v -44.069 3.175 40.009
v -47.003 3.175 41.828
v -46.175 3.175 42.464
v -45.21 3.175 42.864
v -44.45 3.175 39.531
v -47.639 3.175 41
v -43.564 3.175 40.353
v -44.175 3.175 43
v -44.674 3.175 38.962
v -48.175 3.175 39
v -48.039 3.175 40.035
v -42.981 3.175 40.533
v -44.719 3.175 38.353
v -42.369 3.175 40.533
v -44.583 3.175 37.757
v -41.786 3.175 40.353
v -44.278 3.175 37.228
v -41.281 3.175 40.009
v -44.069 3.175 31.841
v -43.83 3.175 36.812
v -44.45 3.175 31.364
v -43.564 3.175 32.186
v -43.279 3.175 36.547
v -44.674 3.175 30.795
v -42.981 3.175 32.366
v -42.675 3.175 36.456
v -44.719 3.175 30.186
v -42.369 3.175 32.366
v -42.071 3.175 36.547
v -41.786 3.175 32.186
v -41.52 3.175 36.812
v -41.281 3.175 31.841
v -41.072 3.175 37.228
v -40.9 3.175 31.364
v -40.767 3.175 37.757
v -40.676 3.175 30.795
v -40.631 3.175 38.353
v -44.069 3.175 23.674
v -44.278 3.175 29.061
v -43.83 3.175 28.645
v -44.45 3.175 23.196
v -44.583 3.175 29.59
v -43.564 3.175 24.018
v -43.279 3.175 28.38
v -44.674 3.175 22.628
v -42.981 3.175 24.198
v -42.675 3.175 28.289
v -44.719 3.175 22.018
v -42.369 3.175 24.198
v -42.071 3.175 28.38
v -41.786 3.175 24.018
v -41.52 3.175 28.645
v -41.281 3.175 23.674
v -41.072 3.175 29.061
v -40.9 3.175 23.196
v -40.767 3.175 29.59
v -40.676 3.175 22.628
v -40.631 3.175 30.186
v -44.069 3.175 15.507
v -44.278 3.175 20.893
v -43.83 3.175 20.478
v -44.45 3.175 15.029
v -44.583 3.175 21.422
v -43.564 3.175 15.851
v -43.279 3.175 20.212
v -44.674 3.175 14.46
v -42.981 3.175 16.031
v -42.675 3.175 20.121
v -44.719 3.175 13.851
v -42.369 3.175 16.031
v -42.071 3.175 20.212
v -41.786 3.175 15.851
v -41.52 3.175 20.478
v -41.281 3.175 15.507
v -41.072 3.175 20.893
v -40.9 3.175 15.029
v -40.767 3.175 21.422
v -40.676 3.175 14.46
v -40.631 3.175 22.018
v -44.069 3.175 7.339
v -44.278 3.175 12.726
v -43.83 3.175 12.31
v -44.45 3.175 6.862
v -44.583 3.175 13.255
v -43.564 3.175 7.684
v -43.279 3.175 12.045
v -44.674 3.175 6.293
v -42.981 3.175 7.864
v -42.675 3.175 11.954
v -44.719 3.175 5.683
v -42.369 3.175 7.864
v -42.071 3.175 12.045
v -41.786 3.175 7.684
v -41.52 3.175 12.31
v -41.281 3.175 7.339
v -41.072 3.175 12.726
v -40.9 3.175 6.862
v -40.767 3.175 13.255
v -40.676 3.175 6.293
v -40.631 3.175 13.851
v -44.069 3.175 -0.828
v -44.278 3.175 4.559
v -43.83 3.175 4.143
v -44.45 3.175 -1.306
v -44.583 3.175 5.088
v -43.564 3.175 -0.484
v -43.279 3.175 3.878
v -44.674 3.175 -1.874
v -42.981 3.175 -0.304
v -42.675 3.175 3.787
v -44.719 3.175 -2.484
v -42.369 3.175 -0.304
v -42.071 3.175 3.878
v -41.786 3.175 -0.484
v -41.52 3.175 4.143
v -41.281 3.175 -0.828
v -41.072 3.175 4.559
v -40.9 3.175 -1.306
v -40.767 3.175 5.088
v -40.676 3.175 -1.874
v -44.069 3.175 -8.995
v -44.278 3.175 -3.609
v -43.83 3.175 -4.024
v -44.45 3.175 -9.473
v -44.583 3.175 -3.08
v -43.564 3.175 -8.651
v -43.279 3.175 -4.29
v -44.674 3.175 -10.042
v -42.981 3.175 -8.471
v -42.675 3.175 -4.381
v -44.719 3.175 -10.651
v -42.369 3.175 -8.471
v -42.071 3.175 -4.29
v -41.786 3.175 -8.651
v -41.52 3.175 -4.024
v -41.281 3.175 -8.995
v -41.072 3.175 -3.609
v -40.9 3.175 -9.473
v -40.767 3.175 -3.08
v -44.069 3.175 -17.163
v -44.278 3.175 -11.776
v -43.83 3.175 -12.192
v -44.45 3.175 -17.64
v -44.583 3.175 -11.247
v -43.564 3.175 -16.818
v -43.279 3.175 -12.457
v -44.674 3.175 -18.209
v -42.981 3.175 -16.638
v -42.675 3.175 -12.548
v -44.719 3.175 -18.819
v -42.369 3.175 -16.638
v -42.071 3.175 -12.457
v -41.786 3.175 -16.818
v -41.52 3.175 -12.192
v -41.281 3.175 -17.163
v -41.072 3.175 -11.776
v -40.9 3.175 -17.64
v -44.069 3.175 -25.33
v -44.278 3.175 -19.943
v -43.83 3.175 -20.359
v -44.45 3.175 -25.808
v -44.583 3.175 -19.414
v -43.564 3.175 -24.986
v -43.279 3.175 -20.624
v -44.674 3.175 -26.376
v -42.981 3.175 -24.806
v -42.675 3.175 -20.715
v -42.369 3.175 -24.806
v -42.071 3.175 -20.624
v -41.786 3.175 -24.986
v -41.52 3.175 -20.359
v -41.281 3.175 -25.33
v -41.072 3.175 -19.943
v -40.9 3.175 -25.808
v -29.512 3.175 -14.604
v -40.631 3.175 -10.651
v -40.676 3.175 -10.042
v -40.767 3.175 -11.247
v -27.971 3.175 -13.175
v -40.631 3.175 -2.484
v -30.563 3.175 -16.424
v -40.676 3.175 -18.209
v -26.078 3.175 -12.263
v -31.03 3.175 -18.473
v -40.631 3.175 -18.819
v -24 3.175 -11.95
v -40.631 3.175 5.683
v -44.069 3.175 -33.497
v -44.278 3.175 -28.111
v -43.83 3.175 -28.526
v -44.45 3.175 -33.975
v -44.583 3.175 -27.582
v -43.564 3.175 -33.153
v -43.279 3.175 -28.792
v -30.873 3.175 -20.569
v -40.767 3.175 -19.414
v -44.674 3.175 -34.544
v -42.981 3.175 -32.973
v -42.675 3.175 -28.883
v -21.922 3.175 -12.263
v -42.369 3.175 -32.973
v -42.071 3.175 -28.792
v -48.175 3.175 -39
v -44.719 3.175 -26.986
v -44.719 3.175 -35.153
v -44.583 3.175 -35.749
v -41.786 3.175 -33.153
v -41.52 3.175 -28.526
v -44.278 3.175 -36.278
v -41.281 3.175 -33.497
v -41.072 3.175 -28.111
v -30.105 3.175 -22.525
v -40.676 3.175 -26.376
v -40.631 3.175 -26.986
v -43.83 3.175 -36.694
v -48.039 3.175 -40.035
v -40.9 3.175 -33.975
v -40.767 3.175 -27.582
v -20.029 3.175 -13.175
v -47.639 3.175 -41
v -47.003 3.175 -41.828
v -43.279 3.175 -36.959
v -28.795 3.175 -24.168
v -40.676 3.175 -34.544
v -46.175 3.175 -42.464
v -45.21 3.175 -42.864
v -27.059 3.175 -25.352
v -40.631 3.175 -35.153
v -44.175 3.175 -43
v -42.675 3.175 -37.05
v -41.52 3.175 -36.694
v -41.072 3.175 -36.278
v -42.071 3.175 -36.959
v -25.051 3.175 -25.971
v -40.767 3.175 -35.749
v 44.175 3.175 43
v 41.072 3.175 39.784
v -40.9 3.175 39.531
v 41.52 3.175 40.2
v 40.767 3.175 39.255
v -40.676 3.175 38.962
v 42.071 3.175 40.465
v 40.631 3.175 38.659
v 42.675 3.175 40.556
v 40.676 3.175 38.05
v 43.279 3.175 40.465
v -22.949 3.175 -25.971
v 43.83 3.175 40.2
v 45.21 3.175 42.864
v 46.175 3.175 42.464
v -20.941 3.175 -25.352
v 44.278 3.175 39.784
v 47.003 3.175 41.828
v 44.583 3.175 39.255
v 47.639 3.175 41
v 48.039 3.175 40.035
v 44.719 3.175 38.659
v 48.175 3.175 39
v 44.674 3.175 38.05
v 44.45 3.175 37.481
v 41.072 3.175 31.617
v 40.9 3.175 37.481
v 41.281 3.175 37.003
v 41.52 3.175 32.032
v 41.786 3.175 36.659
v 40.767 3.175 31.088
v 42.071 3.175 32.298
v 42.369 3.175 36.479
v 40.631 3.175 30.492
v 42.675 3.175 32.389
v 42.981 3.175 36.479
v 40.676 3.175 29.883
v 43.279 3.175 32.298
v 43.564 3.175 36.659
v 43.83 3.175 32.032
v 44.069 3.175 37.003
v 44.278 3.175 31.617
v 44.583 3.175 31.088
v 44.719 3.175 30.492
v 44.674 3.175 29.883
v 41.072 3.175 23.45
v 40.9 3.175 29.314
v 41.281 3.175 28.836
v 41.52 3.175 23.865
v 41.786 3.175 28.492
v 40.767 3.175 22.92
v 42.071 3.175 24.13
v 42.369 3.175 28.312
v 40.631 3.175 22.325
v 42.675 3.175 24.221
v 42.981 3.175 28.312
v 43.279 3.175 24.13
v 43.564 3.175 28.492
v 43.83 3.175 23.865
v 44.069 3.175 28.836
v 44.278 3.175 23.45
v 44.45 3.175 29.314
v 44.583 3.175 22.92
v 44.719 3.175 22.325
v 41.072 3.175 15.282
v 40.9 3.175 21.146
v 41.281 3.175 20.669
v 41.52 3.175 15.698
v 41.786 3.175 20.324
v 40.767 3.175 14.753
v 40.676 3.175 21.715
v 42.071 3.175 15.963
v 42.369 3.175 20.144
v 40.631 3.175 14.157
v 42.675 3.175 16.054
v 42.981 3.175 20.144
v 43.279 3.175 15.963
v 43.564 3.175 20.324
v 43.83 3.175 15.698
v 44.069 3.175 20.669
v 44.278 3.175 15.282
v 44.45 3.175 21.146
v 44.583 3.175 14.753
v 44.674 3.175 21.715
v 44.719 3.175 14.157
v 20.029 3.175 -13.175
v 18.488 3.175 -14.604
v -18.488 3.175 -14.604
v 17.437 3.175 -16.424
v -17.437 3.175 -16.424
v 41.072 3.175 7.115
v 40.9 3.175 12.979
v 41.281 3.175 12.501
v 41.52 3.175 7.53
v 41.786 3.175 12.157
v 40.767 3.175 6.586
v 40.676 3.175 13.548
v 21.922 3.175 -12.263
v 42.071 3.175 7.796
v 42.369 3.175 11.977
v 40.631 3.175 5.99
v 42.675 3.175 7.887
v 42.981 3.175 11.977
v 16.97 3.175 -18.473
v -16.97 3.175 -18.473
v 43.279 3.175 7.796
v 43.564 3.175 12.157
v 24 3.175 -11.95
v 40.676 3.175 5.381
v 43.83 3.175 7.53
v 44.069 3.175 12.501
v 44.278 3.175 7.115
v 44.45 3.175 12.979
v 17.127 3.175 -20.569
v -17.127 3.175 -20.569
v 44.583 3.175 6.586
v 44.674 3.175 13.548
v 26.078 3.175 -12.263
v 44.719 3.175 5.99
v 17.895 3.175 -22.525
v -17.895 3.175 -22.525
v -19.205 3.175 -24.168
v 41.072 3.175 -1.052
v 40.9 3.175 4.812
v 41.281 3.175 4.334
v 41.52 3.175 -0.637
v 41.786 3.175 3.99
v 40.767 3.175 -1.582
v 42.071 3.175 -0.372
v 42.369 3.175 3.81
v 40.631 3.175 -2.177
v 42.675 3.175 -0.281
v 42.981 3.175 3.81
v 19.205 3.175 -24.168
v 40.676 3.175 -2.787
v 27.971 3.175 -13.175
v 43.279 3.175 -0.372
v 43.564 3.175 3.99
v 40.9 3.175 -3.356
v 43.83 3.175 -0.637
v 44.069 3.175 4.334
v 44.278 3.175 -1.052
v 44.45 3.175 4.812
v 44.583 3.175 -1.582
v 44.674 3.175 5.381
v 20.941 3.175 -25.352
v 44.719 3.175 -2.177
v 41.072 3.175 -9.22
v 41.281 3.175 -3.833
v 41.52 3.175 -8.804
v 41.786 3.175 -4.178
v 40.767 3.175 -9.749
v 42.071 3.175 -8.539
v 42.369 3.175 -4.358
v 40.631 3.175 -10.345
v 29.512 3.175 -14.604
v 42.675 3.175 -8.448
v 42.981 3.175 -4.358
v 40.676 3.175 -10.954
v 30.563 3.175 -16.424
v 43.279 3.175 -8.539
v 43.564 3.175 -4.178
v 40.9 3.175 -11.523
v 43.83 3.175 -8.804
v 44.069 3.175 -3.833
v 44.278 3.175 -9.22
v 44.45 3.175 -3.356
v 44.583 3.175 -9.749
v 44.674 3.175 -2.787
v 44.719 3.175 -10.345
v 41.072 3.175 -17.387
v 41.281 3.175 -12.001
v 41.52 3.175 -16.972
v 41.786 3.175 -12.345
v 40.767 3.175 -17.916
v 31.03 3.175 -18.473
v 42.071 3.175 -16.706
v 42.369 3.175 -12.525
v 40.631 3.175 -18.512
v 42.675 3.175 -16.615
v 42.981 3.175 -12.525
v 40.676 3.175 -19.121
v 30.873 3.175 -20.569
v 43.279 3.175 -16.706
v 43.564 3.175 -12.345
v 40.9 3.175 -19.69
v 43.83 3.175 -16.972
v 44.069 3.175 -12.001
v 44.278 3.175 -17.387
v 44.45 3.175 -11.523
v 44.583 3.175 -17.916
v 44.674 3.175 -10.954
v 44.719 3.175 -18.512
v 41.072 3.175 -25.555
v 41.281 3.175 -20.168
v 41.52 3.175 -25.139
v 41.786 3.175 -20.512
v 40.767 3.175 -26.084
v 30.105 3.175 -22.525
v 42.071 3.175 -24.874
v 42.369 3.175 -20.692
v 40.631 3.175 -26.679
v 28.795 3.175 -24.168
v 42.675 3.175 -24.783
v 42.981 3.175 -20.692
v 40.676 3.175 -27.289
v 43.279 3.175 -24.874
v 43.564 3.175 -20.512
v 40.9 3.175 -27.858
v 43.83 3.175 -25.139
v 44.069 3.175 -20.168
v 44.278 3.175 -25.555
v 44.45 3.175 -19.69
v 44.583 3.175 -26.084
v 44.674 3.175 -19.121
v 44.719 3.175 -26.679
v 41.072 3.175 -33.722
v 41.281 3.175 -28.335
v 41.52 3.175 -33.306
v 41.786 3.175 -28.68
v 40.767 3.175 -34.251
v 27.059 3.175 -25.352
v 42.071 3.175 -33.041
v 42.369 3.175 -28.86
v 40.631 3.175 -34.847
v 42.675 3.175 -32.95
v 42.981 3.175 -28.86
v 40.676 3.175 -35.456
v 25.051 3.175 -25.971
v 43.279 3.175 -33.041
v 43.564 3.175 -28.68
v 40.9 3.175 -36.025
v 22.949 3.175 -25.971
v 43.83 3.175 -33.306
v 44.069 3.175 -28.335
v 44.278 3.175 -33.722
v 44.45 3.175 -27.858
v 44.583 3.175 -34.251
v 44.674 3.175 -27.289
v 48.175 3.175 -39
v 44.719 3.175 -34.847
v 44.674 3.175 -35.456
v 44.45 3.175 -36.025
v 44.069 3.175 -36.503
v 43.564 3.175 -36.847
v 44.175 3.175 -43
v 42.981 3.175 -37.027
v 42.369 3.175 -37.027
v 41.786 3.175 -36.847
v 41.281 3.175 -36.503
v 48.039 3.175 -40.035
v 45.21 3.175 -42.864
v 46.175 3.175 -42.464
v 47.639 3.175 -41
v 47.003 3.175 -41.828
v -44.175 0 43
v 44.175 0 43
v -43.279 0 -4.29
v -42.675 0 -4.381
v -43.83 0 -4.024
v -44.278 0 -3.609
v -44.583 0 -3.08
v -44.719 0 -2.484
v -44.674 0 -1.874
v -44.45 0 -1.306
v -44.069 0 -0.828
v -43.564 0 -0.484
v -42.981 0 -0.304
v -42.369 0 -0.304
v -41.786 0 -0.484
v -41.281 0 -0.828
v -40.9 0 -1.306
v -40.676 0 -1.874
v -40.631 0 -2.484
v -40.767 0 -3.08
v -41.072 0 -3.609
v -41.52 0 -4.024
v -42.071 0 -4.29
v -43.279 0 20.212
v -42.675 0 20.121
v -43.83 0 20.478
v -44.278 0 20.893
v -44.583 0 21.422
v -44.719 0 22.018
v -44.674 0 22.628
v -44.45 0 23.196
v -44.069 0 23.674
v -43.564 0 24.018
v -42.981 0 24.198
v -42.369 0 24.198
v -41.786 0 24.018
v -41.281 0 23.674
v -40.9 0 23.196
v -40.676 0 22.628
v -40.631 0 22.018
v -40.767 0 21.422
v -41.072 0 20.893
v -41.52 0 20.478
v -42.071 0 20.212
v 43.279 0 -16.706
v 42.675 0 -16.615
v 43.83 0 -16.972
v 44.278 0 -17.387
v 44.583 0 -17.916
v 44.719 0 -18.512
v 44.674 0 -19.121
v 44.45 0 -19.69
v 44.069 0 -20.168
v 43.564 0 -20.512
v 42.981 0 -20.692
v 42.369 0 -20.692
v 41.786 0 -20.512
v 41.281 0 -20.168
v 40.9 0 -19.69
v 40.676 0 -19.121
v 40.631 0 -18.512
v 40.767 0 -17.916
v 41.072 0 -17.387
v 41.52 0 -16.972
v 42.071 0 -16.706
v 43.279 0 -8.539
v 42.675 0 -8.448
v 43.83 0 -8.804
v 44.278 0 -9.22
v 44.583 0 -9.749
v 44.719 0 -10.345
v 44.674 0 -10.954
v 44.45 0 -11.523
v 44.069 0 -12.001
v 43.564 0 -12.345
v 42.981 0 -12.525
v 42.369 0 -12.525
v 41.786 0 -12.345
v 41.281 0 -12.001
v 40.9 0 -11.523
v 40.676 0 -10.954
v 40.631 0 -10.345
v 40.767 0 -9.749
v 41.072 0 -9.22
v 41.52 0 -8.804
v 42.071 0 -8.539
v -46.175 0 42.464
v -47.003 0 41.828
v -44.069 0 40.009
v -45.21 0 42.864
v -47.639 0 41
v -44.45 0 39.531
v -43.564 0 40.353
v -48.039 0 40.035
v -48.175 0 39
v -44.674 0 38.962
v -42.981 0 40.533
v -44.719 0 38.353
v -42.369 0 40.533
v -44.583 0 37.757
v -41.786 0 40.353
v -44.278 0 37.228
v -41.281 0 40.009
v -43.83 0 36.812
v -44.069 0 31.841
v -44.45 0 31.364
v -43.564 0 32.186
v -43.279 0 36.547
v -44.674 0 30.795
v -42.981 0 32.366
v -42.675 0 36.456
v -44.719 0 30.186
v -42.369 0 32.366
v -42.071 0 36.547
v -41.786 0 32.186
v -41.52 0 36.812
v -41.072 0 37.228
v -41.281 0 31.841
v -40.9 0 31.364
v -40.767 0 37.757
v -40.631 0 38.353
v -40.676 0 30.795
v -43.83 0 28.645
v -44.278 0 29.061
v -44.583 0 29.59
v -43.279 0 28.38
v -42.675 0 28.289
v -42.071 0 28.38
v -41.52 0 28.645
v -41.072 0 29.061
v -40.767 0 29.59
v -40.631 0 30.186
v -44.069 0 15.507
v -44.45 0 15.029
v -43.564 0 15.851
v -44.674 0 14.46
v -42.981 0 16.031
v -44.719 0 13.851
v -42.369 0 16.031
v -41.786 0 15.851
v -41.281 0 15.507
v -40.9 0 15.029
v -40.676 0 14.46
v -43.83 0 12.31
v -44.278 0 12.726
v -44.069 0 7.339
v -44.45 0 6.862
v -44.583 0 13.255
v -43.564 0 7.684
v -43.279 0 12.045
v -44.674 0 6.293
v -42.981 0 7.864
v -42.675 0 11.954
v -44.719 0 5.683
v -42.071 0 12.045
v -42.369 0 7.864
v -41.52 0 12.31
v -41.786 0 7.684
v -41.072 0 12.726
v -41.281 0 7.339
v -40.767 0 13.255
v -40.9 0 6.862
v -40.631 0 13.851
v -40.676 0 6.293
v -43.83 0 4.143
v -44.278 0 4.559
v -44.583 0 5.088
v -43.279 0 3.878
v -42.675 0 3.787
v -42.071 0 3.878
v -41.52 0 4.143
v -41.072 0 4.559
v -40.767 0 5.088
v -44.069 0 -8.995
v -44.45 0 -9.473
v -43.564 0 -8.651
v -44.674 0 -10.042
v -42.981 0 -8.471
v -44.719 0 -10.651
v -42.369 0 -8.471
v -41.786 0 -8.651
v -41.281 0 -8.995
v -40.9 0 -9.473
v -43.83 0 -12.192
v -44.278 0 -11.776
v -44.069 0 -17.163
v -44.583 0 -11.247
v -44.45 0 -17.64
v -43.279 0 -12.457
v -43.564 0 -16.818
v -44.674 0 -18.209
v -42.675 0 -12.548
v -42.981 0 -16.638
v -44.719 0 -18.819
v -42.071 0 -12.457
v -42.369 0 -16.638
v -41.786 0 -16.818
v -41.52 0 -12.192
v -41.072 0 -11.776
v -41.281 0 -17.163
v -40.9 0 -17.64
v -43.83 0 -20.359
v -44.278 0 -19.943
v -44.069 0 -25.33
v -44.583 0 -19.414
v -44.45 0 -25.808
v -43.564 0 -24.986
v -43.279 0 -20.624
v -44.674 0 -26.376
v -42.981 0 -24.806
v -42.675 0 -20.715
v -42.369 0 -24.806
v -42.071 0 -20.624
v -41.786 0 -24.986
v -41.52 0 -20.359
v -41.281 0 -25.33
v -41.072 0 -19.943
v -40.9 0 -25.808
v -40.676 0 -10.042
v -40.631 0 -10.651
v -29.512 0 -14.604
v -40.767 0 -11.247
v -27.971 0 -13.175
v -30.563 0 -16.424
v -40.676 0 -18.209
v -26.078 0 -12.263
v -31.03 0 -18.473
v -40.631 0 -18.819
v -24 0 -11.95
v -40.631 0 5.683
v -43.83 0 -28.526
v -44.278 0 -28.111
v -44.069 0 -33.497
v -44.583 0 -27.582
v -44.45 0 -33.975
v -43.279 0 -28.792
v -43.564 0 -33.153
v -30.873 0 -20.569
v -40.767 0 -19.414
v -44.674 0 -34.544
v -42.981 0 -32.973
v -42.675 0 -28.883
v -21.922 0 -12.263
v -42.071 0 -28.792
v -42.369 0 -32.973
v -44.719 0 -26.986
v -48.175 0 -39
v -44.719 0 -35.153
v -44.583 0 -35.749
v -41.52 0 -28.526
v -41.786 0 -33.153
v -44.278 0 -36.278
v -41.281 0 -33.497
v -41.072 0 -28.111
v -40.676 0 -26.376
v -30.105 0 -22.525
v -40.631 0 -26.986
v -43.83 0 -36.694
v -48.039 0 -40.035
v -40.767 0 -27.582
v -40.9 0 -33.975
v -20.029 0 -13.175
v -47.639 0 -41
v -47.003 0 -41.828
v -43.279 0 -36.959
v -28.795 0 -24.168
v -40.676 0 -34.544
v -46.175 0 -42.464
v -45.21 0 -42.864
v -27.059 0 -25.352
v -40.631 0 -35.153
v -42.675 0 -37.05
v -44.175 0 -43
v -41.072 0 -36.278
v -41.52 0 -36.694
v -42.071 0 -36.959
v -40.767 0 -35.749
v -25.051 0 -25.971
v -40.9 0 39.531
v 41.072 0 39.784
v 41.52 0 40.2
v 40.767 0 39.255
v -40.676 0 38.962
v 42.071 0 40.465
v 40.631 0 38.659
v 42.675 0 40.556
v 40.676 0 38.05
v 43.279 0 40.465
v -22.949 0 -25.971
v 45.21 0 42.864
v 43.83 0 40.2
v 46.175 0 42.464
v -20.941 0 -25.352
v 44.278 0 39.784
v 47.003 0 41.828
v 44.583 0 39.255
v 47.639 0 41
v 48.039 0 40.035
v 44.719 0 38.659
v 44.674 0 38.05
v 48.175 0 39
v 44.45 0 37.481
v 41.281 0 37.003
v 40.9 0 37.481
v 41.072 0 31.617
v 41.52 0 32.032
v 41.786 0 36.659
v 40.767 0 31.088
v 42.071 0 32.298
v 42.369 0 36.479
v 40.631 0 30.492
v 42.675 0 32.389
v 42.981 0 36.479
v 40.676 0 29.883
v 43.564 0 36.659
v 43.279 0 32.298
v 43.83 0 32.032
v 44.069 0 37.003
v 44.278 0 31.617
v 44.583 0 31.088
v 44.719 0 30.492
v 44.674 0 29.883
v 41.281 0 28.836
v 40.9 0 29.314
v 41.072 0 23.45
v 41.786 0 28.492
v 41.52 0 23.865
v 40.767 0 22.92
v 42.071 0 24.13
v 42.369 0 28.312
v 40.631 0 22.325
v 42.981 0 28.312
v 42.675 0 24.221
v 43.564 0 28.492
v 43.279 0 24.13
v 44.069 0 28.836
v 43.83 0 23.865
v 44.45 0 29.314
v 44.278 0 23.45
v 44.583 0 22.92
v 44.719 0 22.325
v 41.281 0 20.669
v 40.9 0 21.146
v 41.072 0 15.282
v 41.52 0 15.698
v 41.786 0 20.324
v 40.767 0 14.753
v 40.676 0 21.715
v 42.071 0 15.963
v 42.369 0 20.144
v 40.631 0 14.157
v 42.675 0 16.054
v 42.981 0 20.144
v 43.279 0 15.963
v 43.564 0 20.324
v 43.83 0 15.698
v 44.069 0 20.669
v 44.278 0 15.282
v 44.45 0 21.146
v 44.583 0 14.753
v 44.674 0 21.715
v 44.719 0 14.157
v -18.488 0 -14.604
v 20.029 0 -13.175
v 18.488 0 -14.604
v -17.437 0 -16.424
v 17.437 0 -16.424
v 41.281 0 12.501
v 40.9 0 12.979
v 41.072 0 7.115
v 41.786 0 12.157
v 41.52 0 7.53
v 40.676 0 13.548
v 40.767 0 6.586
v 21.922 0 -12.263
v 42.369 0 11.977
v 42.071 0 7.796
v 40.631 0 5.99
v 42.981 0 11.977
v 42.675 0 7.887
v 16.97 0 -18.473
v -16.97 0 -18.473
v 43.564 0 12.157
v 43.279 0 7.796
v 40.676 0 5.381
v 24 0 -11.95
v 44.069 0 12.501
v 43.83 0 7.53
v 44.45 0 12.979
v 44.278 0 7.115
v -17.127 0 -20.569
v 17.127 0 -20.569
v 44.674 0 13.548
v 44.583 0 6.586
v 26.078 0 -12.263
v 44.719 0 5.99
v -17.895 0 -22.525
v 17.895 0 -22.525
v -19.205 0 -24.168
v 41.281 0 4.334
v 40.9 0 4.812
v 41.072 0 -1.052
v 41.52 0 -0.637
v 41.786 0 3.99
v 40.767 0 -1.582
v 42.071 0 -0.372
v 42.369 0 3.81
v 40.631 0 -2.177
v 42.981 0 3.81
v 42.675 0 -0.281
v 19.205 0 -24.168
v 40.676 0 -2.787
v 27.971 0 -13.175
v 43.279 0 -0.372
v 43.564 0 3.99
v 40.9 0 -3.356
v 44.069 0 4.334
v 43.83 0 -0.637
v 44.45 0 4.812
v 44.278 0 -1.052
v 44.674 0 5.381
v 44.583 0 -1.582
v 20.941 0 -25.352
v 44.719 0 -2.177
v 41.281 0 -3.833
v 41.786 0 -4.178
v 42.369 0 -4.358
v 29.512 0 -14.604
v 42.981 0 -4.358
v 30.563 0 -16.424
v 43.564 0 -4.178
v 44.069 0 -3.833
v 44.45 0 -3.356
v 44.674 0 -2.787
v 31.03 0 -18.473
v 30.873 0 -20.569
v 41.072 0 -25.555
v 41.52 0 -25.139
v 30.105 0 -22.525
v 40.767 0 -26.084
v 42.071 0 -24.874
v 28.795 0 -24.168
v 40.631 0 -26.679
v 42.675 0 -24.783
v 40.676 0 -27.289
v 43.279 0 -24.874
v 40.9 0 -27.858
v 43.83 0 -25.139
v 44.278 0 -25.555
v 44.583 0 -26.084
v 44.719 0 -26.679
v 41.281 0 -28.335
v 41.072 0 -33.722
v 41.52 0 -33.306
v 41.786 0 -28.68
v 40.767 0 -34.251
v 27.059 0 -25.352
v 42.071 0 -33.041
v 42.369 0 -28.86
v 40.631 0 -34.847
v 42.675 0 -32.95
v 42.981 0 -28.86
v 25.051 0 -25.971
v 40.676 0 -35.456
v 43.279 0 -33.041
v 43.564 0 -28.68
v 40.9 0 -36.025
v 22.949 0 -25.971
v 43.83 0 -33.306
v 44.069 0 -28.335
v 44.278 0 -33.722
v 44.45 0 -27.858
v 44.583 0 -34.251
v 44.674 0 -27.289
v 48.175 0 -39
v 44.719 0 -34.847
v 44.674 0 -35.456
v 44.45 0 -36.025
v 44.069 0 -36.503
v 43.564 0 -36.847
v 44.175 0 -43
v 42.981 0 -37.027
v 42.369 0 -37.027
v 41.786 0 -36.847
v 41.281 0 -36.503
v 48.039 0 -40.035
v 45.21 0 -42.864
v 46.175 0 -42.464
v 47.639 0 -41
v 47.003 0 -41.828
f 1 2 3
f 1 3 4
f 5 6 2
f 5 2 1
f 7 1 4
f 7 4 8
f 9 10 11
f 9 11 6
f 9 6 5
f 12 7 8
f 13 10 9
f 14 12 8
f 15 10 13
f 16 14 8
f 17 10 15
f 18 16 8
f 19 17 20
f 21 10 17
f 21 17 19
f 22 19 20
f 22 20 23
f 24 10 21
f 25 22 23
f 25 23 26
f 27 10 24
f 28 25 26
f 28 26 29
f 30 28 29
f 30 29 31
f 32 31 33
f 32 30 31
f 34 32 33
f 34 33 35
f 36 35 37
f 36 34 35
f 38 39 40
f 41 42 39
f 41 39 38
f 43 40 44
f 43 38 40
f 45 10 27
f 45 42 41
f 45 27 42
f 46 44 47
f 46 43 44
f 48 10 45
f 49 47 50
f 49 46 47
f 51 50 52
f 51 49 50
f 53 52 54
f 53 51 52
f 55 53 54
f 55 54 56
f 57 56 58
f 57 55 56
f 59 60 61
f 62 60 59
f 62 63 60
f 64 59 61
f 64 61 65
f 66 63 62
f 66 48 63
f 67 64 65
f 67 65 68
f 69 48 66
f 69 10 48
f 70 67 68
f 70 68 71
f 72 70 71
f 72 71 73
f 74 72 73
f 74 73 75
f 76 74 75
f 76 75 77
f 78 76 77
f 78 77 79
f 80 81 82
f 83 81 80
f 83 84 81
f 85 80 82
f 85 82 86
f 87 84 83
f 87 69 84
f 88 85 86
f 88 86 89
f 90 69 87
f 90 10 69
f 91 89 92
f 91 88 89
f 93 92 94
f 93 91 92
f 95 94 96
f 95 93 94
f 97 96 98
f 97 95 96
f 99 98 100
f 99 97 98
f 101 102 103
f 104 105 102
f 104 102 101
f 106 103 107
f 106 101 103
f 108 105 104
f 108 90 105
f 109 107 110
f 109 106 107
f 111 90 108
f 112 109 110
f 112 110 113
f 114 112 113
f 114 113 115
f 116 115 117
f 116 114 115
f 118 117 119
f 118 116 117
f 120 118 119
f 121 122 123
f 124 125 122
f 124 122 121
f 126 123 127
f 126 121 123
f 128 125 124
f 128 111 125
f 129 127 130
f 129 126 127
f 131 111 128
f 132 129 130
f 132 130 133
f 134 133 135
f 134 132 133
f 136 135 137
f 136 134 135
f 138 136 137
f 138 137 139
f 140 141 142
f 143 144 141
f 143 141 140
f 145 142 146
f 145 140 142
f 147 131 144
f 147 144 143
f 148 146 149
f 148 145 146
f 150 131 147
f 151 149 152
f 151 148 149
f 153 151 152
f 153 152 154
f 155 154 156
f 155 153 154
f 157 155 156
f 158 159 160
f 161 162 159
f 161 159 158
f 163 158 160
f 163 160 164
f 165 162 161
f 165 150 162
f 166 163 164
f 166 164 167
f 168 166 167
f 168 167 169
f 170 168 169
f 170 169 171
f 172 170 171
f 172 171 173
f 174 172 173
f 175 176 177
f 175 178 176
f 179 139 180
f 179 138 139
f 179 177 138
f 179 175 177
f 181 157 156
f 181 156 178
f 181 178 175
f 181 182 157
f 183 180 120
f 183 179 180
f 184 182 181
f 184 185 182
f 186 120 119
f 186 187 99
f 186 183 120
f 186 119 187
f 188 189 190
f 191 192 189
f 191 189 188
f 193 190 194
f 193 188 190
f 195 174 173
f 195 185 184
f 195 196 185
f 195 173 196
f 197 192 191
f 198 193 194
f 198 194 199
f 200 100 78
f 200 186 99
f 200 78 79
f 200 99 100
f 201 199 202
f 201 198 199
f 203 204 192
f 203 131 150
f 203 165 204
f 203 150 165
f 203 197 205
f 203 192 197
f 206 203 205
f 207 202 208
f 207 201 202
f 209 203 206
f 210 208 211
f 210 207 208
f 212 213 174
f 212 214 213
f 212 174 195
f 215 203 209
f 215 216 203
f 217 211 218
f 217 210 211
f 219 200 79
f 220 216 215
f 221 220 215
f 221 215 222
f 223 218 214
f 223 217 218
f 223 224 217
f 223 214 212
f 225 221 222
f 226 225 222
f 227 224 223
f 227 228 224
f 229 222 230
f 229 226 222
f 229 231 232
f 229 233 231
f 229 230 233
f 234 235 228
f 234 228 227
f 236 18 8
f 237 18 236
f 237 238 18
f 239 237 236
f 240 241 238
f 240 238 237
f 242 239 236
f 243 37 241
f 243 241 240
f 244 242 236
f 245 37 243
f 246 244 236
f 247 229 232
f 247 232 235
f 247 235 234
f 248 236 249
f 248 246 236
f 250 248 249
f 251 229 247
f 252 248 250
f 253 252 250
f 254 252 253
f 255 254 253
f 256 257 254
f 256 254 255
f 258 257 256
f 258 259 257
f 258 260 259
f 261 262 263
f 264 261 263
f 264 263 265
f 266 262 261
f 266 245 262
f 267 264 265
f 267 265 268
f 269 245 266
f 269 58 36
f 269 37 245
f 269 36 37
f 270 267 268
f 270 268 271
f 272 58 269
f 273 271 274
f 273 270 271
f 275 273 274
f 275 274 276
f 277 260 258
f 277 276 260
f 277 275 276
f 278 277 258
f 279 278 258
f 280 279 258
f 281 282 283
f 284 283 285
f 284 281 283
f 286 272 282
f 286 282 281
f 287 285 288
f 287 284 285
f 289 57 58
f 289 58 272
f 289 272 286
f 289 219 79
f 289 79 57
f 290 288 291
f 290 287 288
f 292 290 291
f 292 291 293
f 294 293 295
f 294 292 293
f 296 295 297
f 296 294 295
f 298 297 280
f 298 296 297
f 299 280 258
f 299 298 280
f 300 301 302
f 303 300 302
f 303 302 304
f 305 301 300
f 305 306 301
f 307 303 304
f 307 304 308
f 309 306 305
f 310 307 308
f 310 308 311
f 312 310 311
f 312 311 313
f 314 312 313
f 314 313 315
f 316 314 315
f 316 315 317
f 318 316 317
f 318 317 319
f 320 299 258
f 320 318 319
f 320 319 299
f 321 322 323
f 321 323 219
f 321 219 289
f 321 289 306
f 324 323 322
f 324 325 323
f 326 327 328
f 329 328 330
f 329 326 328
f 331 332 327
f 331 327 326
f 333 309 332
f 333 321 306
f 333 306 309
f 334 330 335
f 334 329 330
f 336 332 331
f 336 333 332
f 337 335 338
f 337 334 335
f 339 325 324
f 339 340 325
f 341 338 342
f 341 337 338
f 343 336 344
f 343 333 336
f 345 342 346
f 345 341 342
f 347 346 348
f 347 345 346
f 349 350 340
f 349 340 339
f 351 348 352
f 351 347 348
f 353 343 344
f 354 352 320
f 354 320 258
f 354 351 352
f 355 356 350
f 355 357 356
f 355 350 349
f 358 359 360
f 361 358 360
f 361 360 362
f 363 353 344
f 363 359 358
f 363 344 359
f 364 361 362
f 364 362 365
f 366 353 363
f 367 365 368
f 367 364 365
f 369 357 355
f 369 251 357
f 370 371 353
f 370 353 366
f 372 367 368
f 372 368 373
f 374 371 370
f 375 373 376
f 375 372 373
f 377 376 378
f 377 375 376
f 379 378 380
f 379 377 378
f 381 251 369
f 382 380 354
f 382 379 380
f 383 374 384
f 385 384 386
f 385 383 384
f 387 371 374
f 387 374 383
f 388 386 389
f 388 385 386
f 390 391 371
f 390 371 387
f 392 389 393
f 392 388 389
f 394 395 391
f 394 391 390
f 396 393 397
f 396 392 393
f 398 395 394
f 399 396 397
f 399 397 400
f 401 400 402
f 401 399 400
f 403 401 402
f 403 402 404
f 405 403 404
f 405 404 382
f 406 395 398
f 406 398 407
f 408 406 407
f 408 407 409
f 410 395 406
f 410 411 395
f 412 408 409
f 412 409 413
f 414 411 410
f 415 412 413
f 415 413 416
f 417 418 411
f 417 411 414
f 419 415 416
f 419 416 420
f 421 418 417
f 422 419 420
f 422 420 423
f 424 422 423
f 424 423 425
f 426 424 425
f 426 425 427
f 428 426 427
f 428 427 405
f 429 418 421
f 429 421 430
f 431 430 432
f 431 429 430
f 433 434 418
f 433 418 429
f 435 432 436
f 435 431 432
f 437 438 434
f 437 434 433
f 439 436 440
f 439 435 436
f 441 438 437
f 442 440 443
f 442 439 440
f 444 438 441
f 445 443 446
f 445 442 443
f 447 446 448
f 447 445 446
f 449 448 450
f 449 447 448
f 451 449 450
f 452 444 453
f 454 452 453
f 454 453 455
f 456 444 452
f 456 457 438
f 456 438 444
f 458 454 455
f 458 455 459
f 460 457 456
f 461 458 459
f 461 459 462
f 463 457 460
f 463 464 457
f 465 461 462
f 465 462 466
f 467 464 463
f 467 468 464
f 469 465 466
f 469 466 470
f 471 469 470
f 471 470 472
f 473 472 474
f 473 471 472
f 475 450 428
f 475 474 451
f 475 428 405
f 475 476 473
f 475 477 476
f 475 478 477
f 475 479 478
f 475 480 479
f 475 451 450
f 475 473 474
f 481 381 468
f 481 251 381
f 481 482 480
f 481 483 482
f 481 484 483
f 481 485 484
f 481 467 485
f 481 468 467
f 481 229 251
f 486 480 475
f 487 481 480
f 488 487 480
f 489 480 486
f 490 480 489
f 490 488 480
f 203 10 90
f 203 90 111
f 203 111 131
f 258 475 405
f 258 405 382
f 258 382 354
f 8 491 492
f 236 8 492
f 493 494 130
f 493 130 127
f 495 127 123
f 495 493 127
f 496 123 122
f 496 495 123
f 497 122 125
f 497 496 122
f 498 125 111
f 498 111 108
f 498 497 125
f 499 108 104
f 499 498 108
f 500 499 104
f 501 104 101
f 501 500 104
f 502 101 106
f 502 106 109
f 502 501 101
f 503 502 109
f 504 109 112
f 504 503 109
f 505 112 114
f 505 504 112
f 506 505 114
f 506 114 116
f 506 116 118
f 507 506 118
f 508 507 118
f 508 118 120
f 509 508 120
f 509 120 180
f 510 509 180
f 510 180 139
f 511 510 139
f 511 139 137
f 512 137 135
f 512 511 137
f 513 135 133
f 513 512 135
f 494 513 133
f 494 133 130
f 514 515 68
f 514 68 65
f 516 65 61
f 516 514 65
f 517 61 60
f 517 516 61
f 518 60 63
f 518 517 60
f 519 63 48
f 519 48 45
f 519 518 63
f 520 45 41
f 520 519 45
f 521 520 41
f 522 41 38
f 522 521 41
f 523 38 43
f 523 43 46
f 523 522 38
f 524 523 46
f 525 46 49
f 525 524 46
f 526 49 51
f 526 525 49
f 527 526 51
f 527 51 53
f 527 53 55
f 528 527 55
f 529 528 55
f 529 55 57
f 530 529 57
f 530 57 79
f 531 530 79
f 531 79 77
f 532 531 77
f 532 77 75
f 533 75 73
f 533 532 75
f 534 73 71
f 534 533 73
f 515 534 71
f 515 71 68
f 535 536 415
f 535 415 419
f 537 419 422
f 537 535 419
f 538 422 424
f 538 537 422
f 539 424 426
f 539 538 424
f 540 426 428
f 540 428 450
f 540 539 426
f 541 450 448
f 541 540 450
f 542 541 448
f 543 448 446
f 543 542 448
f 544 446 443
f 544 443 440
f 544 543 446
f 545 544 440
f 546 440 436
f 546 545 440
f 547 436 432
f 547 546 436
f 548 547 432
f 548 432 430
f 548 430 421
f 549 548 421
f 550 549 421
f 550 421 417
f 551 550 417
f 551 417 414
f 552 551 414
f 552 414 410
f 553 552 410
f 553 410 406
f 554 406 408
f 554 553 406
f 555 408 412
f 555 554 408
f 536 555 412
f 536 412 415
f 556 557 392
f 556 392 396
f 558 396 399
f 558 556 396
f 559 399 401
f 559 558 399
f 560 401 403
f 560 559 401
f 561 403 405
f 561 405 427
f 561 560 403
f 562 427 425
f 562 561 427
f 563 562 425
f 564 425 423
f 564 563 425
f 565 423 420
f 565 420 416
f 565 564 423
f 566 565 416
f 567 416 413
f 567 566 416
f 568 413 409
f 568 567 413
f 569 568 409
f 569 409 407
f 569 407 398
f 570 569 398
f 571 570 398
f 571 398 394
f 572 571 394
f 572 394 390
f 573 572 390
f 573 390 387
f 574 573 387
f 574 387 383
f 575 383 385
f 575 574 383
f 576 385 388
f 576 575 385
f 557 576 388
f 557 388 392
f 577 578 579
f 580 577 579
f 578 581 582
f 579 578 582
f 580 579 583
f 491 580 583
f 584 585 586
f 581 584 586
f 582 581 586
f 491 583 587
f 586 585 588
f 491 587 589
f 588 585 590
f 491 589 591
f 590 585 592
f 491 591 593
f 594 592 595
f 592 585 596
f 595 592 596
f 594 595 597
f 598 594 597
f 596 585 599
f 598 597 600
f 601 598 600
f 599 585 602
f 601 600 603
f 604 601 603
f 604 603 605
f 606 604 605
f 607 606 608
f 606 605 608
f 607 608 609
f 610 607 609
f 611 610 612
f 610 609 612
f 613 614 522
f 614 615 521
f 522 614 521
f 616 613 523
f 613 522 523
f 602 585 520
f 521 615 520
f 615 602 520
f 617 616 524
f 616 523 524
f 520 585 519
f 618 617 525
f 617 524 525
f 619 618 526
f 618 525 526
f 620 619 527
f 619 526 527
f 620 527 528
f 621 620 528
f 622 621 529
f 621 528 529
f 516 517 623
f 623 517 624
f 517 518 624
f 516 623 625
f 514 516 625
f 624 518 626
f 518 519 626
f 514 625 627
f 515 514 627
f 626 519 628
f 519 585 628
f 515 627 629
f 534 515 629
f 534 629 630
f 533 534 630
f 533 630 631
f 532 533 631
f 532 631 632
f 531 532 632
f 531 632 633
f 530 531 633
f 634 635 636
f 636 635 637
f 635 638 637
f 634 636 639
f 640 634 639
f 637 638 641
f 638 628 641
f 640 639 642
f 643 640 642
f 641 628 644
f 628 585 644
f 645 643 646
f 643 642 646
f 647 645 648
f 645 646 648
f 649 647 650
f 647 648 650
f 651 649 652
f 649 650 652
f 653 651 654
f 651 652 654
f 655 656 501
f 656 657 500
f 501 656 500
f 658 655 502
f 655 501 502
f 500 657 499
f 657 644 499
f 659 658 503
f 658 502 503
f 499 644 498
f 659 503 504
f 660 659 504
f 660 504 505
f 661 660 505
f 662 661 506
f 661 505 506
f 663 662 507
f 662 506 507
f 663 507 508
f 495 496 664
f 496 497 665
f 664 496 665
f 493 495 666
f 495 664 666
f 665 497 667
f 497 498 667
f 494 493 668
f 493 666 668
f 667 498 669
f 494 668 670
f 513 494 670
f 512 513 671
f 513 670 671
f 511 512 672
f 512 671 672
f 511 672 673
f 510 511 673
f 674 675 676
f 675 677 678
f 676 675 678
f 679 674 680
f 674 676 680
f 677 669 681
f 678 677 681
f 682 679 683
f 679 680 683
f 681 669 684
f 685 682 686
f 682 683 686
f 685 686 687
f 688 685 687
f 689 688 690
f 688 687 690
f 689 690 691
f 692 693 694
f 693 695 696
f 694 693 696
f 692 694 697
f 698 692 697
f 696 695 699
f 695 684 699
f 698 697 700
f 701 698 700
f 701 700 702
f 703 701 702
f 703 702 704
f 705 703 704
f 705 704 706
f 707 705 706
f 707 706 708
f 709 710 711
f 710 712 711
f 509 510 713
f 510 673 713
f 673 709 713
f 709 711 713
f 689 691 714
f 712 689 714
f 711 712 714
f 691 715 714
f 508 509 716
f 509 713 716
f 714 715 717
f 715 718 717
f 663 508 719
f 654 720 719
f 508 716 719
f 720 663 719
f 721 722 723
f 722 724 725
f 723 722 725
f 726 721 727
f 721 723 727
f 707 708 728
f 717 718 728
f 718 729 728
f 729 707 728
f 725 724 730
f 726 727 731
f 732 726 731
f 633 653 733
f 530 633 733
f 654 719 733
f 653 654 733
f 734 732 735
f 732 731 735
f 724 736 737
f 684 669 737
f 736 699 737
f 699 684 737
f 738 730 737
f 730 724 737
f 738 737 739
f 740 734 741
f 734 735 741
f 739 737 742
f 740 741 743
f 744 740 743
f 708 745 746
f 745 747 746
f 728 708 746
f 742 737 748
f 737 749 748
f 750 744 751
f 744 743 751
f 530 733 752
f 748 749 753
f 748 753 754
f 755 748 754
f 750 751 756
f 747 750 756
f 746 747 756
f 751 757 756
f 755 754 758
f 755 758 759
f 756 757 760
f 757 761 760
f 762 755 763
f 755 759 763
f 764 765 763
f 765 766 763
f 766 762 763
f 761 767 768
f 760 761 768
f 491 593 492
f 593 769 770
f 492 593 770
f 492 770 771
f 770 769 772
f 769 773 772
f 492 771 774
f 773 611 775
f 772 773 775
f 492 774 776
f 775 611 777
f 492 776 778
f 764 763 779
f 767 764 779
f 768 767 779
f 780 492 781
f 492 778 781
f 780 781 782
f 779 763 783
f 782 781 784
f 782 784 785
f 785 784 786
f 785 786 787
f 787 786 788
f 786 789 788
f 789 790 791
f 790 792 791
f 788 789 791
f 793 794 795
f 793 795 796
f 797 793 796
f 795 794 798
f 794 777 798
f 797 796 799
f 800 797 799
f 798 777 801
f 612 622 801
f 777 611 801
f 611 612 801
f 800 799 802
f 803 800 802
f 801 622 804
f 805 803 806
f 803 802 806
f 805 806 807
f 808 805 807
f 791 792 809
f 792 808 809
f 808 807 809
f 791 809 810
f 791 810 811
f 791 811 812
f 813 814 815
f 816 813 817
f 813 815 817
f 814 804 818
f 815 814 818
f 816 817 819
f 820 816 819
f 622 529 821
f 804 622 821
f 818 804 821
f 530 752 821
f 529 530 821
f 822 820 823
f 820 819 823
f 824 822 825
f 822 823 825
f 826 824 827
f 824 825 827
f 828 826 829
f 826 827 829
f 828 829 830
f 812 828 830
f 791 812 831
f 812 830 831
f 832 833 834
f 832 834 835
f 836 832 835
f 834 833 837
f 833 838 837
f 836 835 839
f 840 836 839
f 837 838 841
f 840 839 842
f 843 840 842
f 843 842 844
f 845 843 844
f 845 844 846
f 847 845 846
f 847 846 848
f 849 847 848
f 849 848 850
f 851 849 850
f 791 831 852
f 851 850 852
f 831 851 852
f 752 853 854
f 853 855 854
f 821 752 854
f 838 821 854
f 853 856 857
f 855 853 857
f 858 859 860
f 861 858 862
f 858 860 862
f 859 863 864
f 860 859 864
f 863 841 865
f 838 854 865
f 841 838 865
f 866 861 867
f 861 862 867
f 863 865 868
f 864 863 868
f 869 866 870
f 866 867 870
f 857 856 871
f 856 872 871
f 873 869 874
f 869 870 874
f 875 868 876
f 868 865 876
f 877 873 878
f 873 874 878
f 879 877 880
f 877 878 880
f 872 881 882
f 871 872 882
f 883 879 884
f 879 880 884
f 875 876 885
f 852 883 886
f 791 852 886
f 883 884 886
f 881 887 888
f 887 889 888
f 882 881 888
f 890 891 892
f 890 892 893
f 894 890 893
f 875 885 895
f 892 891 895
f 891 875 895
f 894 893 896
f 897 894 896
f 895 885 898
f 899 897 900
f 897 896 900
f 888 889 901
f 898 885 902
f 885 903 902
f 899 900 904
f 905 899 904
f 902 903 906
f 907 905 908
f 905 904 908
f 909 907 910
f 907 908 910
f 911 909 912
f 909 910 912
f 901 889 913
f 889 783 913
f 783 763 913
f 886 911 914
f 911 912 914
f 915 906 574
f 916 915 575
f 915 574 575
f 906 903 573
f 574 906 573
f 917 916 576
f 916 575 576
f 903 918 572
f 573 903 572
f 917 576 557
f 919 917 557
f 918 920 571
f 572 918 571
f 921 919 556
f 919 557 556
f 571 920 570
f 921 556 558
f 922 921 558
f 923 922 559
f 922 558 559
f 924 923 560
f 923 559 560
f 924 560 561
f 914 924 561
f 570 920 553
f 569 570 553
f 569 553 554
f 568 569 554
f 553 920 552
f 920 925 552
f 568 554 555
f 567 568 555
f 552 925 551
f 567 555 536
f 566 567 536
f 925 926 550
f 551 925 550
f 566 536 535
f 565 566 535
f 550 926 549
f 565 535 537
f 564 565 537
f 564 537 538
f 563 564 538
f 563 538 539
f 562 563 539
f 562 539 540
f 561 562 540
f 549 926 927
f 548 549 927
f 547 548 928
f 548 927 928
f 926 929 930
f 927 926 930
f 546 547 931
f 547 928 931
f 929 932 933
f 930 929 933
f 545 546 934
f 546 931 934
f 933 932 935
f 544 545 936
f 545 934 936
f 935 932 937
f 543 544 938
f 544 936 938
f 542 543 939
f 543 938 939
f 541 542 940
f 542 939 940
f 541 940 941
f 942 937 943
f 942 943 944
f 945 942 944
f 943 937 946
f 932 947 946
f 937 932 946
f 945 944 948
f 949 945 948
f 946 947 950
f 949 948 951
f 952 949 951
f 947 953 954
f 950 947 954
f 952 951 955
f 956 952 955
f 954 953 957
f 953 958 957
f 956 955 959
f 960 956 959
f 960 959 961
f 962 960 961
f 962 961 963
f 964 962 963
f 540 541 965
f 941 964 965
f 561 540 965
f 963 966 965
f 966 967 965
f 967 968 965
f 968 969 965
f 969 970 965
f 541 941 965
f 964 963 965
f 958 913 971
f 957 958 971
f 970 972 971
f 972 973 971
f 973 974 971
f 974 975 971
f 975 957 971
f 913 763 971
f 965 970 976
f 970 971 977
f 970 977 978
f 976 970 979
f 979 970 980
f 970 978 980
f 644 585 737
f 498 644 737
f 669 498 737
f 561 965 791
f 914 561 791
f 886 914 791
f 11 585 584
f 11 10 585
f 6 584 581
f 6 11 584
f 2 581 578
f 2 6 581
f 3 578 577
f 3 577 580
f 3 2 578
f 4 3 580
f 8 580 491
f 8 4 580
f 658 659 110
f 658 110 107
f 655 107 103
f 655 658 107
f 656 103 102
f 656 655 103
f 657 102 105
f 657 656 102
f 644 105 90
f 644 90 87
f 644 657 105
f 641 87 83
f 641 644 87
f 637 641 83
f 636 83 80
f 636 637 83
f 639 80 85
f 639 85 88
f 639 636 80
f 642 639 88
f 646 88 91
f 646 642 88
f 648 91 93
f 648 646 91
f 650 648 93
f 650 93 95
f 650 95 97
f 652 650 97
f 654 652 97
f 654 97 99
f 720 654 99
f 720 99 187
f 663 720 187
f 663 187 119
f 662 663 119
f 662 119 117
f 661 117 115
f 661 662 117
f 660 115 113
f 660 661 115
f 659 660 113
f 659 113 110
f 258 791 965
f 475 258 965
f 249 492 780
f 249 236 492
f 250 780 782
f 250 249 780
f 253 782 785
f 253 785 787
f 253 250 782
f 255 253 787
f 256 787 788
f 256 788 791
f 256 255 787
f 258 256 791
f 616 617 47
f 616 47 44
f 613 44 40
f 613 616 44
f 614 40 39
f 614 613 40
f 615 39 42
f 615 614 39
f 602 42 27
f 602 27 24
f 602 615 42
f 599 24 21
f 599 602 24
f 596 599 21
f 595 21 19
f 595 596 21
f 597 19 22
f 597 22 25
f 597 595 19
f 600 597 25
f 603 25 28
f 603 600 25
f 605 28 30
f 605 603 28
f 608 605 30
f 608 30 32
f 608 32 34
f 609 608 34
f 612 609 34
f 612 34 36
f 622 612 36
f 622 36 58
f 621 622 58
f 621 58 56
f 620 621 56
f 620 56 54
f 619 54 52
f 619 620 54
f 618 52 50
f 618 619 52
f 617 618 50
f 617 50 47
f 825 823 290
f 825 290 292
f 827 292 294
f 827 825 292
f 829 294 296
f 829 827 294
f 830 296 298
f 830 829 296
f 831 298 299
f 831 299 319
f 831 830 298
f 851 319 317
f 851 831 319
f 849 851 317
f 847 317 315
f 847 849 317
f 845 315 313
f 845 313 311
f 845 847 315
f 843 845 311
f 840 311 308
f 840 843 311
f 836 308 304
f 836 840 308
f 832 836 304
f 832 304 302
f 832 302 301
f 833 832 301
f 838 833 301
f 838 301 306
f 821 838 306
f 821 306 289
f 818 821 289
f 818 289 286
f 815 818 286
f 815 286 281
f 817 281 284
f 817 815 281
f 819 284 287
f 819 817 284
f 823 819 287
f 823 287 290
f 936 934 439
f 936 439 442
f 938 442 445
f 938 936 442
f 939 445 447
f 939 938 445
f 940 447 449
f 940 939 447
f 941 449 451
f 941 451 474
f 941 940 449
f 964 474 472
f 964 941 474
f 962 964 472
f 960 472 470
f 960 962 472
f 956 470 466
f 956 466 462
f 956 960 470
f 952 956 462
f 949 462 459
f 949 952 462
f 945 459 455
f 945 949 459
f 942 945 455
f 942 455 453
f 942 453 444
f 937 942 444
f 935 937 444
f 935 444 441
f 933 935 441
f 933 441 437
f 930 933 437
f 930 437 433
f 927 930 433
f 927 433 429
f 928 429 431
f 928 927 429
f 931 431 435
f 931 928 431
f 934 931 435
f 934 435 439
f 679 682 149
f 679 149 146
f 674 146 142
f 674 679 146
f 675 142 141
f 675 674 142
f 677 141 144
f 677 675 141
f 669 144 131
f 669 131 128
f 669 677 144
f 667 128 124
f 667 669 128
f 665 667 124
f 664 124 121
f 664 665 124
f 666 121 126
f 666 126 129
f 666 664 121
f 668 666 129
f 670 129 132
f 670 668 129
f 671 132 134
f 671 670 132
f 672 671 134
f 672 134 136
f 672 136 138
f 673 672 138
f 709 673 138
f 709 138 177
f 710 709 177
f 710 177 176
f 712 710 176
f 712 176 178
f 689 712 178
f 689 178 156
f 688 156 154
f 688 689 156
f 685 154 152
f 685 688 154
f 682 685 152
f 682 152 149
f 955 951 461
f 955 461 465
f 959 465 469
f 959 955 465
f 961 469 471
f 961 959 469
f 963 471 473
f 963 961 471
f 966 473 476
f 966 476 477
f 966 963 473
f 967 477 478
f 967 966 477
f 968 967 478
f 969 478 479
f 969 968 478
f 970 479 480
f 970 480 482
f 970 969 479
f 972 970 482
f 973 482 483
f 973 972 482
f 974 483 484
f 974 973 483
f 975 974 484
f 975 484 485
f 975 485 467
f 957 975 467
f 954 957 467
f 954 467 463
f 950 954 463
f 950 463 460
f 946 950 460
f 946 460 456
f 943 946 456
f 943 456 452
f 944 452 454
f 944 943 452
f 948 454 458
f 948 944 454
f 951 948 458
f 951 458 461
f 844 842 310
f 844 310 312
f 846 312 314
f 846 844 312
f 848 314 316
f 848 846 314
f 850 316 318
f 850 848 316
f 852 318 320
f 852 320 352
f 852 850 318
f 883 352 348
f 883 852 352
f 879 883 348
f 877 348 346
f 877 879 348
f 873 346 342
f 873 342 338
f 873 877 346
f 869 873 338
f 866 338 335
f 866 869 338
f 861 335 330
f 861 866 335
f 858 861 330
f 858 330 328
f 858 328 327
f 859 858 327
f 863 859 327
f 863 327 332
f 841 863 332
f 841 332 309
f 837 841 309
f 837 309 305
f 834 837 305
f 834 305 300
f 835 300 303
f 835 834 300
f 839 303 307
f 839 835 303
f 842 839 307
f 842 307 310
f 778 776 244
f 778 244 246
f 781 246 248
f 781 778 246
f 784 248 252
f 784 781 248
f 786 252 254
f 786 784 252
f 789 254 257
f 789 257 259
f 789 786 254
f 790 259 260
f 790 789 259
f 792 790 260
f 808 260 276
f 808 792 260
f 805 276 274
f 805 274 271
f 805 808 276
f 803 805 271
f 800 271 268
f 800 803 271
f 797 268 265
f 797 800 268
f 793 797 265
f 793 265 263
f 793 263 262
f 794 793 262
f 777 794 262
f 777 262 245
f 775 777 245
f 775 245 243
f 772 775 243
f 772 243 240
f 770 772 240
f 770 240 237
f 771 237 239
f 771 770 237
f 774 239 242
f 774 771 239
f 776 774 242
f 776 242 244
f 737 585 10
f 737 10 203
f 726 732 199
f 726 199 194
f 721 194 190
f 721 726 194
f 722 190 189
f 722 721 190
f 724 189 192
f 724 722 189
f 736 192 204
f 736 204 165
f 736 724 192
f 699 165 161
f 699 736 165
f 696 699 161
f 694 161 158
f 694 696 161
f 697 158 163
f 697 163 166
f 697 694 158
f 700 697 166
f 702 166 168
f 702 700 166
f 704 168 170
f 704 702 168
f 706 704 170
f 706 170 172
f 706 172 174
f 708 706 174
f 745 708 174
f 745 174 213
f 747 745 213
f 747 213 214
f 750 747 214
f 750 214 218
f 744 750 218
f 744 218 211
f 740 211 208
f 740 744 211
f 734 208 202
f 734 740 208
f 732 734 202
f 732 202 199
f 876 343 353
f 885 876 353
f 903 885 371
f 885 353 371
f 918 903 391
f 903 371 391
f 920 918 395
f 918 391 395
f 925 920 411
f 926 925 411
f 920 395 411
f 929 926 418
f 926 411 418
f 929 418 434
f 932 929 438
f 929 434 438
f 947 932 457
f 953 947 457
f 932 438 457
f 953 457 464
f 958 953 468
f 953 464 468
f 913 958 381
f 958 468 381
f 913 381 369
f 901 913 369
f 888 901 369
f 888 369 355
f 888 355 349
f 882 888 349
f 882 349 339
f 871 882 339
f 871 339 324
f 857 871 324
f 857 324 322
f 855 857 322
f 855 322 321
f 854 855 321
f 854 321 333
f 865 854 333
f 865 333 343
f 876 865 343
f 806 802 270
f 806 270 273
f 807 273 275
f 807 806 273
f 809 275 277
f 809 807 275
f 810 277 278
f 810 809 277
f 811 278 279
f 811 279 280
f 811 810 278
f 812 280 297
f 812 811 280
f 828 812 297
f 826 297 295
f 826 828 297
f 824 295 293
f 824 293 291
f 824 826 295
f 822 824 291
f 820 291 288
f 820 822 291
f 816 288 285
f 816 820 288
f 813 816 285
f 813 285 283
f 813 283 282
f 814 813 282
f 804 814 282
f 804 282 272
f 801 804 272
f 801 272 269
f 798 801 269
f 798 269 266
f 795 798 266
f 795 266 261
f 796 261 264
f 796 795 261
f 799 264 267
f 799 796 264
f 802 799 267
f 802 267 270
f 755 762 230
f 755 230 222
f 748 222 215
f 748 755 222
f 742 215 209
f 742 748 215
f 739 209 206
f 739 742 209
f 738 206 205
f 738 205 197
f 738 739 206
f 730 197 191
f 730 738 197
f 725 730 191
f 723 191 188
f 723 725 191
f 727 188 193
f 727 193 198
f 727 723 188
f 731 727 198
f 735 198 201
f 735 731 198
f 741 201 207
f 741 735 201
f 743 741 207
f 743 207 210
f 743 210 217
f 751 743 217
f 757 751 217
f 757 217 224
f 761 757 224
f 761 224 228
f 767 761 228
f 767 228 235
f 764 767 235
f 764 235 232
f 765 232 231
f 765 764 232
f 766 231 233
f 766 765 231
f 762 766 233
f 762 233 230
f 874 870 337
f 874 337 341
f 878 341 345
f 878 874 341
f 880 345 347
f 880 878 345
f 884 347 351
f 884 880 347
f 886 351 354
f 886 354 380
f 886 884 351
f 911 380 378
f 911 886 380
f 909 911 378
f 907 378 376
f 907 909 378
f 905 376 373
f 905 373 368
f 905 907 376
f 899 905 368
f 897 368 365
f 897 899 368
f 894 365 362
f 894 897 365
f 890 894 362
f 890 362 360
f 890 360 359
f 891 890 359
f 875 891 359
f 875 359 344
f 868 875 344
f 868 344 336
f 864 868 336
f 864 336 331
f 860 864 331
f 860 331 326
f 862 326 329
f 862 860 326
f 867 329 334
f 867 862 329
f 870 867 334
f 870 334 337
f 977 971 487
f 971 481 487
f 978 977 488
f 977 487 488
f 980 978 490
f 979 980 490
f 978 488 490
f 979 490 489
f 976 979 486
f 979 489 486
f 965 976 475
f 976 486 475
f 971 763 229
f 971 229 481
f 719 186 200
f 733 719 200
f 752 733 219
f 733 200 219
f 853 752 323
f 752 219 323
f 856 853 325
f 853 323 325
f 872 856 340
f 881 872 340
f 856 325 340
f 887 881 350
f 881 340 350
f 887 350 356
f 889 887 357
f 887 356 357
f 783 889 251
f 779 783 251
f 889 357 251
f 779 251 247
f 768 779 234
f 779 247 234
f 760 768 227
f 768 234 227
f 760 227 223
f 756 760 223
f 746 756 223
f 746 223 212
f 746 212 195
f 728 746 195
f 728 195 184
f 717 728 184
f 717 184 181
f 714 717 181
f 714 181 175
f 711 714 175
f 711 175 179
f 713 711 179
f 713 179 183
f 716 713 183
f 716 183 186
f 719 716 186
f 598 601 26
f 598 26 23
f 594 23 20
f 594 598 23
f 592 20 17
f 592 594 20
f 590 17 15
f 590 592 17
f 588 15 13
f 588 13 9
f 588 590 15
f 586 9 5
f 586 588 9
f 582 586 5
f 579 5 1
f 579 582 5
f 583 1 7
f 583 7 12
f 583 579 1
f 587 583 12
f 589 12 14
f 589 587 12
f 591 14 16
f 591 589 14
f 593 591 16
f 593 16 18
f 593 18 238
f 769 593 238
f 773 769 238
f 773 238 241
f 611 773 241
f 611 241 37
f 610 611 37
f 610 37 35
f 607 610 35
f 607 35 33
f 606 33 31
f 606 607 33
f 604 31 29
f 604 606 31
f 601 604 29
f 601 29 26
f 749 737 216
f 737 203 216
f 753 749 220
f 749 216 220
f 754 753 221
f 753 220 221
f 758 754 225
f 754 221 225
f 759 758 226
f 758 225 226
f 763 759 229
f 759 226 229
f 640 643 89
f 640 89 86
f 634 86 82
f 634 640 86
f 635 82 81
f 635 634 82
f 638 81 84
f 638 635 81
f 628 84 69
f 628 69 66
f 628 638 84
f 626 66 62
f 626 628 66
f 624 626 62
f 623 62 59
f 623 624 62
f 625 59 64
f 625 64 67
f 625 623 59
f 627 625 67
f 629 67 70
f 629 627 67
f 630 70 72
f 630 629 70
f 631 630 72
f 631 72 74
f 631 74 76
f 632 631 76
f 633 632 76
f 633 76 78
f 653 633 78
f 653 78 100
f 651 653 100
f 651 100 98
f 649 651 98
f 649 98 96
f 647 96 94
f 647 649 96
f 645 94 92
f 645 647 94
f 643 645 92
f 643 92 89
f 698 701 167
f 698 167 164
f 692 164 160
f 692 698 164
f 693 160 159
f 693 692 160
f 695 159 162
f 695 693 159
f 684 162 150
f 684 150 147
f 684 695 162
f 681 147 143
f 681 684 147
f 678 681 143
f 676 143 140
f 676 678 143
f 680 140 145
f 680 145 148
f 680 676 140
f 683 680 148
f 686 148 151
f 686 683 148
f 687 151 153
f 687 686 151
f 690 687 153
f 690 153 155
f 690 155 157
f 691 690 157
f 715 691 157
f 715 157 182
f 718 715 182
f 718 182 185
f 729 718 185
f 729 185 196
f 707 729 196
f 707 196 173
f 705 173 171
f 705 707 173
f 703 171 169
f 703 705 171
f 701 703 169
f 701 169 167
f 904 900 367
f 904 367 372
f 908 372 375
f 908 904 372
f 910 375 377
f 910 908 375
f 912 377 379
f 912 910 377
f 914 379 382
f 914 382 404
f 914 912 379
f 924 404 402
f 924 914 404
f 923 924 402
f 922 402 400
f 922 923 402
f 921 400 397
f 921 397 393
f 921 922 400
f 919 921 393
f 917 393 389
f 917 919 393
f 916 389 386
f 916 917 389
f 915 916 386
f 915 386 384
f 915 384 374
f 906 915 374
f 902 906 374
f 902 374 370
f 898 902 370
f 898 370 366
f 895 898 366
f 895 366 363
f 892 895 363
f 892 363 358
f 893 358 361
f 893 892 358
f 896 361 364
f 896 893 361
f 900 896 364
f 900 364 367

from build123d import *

# Parameters (mm, degrees)
SKETCH1_W           = 96.35
SKETCH1_H           = 86
SKETCH1_R           = 2.05
BOSS_EXTRUDE1_DEPTH = 3.175
FILLET1_R           = 4
SKETCH2_R           = 7.05
CUT_EXTRUDE1_DEPTH  = 3.18


with BuildPart() as part:
    # Sketch1 → Boss-Extrude1 (new body)
    with BuildSketch(Plane(origin=(0, 0, 0), x_dir=(1, 0, 0), z_dir=(0, 1, 0))):
        Rectangle(SKETCH1_W, SKETCH1_H)
        with Locations(Location((42.675, 35, 0), (0, 0, 270))):
            Circle(SKETCH1_R, mode=Mode.SUBTRACT)
        with Locations(Location((42.675, 26.832661921, 0), (0, 0, 270))):
            Circle(SKETCH1_R, mode=Mode.SUBTRACT)
        with Locations(Location((42.675, 18.665323842, 0), (0, 0, 270))):
            Circle(SKETCH1_R, mode=Mode.SUBTRACT)
        with Locations(Location((42.675, 10.497985763, 0), (0, 0, 270))):
            Circle(SKETCH1_R, mode=Mode.SUBTRACT)
        with Locations(Location((42.675, 2.330647684, 0), (0, 0, 270))):
            Circle(SKETCH1_R, mode=Mode.SUBTRACT)
        with Locations(Location((42.675, -5.836690395, 0), (0, 0, 270))):
            Circle(SKETCH1_R, mode=Mode.SUBTRACT)
        with Locations(Location((42.675, -14.004028475, 0), (0, 0, 270))):
            Circle(SKETCH1_R, mode=Mode.SUBTRACT)
        with Locations(Location((42.675, -22.171366554, 0), (0, 0, 270))):
            Circle(SKETCH1_R, mode=Mode.SUBTRACT)
        with Locations(Location((42.675, -30.338704633, 0), (0, 0, 270))):
            Circle(SKETCH1_R, mode=Mode.SUBTRACT)
        with Locations(Location((42.675, -38.506042712, 0), (0, 0, 270))):
            Circle(SKETCH1_R, mode=Mode.SUBTRACT)
        with Locations(Location((-42.675, -38.506042712, 0), (0, 0, 90))):
            Circle(SKETCH1_R, mode=Mode.SUBTRACT)
        with Locations(Location((-42.675, -30.338704633, 0), (0, 0, 90))):
            Circle(SKETCH1_R, mode=Mode.SUBTRACT)
        with Locations(Location((-42.675, -22.171366554, 0), (0, 0, 90))):
            Circle(SKETCH1_R, mode=Mode.SUBTRACT)
        with Locations(Location((-42.675, -14.004028475, 0), (0, 0, 90))):
            Circle(SKETCH1_R, mode=Mode.SUBTRACT)
        with Locations(Location((-42.675, -5.836690395, 0), (0, 0, 90))):
            Circle(SKETCH1_R, mode=Mode.SUBTRACT)
        with Locations(Location((-42.675, 2.330647684, 0), (0, 0, 90))):
            Circle(SKETCH1_R, mode=Mode.SUBTRACT)
        with Locations(Location((-42.675, 10.497985763, 0), (0, 0, 90))):
            Circle(SKETCH1_R, mode=Mode.SUBTRACT)
        with Locations(Location((-42.675, 18.665323842, 0), (0, 0, 90))):
            Circle(SKETCH1_R, mode=Mode.SUBTRACT)
        with Locations(Location((-42.675, 26.832661921, 0), (0, 0, 90))):
            Circle(SKETCH1_R, mode=Mode.SUBTRACT)
        with Locations(Location((-42.675, 35, 0), (0, 0, 90))):
            Circle(SKETCH1_R, mode=Mode.SUBTRACT)
    extrude(amount=BOSS_EXTRUDE1_DEPTH)

    # Fillet1
    fillet1_edges = [part.edges().sort_by_distance(p)[0] for p in [
        (48.175, 1.5875, 43),
        (-48.175, 1.5875, 43),
        (-48.175, 1.5875, -43),
        (48.175, 1.5875, -43),
    ]]
    fillet(fillet1_edges, radius=FILLET1_R)

    # Sketch2 → Cut-Extrude1 (cut)
    with BuildSketch(Plane(origin=(0, 3.175, 0), x_dir=(1, 0, 0), z_dir=(0, 1, 0))):
        with Locations(Location((-24, 19, 0), (0, 0, 270))):
            Circle(SKETCH2_R)
        with Locations(Location((24, 19, 0), (0, 0, 270))):
            Circle(SKETCH2_R)
    extrude(amount=-CUT_EXTRUDE1_DEPTH, mode=Mode.SUBTRACT)


solid = part.part
